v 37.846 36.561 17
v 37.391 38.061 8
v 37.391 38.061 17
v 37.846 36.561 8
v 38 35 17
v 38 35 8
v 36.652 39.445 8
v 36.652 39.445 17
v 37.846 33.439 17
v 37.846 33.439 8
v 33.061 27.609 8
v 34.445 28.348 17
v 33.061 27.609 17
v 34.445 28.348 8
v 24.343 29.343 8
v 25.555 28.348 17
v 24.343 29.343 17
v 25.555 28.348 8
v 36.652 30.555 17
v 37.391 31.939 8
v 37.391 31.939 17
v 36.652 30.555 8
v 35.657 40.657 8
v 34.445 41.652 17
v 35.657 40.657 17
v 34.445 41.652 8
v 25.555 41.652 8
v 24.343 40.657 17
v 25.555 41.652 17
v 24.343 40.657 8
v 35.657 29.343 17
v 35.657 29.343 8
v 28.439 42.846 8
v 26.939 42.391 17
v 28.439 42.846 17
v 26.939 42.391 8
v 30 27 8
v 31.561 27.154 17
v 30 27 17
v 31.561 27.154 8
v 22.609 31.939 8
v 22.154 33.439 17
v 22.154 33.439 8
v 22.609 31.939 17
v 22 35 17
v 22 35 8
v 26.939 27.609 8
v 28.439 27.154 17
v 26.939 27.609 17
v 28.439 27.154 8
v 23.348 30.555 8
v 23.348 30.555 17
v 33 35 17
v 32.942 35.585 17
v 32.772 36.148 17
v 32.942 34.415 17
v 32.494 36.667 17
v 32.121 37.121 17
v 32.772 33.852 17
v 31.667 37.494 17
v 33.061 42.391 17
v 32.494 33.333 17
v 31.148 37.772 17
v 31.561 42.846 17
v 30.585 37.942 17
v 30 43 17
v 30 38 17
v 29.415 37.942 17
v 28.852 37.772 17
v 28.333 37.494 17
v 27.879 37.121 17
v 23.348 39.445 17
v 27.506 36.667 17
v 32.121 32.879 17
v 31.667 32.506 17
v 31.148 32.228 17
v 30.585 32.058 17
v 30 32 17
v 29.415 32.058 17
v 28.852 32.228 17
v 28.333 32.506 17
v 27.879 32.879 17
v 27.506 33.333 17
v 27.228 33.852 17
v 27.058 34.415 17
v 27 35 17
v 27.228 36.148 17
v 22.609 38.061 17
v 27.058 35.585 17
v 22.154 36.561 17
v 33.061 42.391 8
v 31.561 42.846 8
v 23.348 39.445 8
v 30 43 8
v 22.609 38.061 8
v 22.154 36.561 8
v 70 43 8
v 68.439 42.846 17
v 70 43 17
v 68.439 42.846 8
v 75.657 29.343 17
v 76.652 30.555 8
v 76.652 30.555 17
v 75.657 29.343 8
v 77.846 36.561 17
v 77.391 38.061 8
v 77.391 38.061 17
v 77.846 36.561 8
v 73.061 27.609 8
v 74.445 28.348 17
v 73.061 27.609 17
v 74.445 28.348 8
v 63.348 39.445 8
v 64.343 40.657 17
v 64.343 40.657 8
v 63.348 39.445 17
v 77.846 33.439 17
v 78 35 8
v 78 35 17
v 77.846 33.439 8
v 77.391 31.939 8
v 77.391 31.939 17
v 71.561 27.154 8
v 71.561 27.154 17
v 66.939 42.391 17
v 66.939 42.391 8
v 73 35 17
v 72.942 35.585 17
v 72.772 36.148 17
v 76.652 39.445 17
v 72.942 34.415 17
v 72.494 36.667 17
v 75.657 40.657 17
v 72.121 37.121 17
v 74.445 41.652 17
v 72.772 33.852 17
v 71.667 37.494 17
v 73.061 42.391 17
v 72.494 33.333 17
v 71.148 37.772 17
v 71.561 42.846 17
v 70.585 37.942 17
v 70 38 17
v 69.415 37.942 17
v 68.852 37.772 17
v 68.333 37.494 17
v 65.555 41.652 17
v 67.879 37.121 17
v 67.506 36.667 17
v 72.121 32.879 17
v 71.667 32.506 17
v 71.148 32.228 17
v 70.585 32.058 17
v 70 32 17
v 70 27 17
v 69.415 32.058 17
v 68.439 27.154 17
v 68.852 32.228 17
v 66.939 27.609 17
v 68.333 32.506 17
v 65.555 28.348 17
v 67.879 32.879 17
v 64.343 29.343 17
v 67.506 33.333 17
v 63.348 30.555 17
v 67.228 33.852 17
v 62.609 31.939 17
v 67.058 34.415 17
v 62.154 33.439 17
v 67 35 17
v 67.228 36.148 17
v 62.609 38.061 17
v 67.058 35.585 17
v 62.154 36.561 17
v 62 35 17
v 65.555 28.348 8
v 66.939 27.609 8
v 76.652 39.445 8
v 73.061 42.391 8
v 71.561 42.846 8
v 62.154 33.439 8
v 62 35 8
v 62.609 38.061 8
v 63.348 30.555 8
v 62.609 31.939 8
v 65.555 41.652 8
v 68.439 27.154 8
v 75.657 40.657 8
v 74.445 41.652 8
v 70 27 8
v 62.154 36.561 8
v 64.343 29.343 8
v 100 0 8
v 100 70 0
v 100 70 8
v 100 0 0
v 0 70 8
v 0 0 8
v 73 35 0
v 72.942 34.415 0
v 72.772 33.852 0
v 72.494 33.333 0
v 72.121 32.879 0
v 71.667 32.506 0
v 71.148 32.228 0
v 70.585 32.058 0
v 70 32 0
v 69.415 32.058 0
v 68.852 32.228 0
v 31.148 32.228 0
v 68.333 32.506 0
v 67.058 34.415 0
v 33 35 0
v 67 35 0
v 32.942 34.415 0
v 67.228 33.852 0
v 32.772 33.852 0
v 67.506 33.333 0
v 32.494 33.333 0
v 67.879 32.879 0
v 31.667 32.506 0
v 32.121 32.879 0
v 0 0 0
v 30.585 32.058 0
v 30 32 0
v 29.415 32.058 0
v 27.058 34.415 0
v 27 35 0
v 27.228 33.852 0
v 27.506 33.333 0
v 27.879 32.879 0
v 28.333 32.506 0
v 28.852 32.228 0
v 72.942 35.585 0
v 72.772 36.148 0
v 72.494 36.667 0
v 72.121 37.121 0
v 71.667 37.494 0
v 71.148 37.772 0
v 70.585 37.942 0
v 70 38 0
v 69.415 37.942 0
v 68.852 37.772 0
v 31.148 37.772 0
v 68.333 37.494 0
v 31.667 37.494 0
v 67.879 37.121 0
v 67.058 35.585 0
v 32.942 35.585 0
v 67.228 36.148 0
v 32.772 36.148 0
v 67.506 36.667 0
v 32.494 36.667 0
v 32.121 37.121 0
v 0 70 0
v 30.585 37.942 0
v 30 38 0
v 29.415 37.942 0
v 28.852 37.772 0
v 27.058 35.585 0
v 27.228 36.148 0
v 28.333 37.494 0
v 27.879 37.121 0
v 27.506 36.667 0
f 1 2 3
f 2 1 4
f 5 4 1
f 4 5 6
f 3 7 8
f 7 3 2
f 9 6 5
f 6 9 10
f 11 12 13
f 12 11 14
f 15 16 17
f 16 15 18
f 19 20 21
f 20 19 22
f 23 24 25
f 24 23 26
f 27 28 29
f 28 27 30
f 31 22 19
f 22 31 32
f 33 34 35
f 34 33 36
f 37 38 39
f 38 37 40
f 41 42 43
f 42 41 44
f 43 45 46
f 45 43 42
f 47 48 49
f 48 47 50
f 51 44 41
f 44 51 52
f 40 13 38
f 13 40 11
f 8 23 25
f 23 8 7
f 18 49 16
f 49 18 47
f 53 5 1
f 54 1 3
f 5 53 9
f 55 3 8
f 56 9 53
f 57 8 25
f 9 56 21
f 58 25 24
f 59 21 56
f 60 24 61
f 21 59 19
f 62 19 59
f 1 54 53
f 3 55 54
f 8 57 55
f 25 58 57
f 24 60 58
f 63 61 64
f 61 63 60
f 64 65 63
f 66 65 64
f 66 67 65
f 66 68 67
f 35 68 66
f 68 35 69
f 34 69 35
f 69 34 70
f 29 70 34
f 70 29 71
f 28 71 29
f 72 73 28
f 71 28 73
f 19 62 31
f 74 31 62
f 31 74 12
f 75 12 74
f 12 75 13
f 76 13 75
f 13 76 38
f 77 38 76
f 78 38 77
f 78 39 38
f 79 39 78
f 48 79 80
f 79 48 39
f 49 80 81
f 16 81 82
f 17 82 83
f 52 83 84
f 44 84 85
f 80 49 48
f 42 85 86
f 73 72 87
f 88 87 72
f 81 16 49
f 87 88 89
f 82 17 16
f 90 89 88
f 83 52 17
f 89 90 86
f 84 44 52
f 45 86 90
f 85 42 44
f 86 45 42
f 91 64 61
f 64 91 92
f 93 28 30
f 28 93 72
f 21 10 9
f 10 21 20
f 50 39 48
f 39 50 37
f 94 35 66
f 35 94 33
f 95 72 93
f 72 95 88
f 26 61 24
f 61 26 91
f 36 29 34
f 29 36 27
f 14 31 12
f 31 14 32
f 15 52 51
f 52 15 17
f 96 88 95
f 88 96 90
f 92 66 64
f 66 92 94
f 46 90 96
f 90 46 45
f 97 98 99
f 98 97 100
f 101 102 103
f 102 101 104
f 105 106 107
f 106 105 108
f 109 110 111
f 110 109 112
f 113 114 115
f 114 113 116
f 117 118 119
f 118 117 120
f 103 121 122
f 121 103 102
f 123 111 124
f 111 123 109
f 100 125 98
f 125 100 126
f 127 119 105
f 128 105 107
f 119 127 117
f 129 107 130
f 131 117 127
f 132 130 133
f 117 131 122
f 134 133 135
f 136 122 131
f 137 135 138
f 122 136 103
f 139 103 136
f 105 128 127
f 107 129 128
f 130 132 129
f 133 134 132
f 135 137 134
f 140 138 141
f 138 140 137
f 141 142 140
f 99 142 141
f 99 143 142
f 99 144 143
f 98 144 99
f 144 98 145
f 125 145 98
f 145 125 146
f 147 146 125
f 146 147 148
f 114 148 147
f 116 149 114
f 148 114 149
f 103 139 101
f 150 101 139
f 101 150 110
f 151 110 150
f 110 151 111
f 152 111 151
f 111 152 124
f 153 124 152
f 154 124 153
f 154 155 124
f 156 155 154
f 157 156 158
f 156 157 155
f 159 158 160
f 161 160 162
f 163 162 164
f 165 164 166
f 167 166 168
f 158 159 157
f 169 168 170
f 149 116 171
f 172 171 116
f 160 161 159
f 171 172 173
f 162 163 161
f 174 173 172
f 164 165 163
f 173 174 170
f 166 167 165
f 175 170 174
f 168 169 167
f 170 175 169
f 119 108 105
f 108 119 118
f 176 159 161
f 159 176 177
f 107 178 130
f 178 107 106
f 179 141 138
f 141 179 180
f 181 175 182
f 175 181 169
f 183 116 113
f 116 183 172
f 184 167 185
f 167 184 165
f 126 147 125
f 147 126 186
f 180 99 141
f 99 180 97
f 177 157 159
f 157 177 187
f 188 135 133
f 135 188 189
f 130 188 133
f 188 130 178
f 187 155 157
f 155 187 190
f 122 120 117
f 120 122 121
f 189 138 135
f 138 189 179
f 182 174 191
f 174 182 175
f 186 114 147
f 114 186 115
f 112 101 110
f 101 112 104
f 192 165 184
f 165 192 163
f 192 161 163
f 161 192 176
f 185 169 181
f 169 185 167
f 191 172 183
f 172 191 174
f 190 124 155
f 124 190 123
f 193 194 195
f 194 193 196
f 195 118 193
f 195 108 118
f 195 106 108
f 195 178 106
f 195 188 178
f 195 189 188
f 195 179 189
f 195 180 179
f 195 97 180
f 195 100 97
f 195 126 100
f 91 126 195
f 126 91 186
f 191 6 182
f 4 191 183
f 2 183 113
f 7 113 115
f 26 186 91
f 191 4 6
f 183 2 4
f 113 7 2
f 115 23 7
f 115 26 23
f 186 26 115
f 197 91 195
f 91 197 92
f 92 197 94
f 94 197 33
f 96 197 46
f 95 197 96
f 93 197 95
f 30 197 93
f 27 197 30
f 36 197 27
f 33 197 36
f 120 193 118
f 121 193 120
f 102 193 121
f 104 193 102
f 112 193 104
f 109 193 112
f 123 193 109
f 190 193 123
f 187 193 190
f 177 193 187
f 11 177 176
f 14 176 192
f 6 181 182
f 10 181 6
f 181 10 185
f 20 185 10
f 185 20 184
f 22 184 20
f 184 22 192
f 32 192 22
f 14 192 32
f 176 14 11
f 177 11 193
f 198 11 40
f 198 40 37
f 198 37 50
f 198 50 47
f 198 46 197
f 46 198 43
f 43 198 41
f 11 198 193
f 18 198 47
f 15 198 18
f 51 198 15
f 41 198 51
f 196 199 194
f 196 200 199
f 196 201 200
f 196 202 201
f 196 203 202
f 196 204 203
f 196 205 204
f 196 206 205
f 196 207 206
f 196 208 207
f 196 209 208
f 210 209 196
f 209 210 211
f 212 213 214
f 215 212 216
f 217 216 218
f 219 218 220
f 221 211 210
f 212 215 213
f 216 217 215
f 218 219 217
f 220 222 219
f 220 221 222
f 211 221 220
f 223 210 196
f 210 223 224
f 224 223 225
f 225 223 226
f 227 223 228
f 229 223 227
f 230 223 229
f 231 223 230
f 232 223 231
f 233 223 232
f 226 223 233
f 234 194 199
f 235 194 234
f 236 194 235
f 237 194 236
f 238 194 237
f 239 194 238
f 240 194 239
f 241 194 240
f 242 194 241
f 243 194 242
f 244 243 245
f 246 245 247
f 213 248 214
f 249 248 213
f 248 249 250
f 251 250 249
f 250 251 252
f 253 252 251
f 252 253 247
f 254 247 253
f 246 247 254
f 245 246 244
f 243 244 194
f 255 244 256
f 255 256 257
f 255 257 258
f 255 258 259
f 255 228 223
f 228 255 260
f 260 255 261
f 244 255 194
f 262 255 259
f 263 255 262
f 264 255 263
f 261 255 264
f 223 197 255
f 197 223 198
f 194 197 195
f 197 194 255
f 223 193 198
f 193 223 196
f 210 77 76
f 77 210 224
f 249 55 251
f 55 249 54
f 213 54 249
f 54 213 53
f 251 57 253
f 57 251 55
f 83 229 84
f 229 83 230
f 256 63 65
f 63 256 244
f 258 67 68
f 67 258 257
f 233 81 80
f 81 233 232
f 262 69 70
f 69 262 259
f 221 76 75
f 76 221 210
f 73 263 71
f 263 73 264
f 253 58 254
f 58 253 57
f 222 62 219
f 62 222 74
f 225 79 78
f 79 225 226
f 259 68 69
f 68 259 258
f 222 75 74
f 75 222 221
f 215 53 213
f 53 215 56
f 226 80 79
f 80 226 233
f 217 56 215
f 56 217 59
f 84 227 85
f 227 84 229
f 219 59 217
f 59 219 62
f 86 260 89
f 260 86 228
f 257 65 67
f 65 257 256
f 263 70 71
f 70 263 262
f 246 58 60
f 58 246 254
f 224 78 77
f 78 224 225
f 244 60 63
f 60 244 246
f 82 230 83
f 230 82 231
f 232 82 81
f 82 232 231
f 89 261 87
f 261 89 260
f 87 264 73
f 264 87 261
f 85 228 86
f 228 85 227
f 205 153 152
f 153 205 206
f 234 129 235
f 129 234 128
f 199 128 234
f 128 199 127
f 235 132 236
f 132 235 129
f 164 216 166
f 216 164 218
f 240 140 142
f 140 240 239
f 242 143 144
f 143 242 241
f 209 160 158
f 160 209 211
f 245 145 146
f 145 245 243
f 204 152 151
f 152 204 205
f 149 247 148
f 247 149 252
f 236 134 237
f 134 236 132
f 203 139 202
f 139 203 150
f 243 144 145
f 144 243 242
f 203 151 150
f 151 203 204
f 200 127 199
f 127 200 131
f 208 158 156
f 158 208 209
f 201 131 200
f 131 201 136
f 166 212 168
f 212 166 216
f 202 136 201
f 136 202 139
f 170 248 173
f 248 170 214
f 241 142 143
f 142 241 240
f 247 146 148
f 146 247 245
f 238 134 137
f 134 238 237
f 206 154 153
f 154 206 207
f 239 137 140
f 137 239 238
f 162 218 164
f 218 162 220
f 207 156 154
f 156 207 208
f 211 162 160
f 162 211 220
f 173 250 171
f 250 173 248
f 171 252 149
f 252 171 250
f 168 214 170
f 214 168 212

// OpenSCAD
$fn = 32;

// ----------------------------------------------------------------------
// Drill jig: two_boss jig
// ----------------------------------------------------------------------

// --- parameters (mm) ---
plate_l = 100;            // plate length, X
plate_w = 70;             // plate width, Y
plate_t = 8;              // plate thickness
boss_d = 16;              // guide boss diameter
boss_h = 10;              // boss height above the plate
guide_d = 6;              // guide hole diameter
boss_pitch = 40;          // boss pitch

n_boss = 2;  // guide bosses
boss_x0 = (plate_l - (n_boss - 1) * boss_pitch) / 2;  // first boss X
boss_top = plate_t - 1 + boss_h;  // boss crown height
total_h = boss_top;  // overall height

difference() {
  union() {
  cube([plate_l, plate_w, plate_t]);
  for (i = [0 : n_boss - 1])
    translate([boss_x0 + i * boss_pitch, plate_w / 2, plate_t - 1])
      cylinder(h = boss_h, d = boss_d);
  }
  for (i = [0 : n_boss - 1])
    translate([boss_x0 + i * boss_pitch, plate_w / 2, -1])
      cylinder(h = plate_t + boss_h, d = guide_d);
}
